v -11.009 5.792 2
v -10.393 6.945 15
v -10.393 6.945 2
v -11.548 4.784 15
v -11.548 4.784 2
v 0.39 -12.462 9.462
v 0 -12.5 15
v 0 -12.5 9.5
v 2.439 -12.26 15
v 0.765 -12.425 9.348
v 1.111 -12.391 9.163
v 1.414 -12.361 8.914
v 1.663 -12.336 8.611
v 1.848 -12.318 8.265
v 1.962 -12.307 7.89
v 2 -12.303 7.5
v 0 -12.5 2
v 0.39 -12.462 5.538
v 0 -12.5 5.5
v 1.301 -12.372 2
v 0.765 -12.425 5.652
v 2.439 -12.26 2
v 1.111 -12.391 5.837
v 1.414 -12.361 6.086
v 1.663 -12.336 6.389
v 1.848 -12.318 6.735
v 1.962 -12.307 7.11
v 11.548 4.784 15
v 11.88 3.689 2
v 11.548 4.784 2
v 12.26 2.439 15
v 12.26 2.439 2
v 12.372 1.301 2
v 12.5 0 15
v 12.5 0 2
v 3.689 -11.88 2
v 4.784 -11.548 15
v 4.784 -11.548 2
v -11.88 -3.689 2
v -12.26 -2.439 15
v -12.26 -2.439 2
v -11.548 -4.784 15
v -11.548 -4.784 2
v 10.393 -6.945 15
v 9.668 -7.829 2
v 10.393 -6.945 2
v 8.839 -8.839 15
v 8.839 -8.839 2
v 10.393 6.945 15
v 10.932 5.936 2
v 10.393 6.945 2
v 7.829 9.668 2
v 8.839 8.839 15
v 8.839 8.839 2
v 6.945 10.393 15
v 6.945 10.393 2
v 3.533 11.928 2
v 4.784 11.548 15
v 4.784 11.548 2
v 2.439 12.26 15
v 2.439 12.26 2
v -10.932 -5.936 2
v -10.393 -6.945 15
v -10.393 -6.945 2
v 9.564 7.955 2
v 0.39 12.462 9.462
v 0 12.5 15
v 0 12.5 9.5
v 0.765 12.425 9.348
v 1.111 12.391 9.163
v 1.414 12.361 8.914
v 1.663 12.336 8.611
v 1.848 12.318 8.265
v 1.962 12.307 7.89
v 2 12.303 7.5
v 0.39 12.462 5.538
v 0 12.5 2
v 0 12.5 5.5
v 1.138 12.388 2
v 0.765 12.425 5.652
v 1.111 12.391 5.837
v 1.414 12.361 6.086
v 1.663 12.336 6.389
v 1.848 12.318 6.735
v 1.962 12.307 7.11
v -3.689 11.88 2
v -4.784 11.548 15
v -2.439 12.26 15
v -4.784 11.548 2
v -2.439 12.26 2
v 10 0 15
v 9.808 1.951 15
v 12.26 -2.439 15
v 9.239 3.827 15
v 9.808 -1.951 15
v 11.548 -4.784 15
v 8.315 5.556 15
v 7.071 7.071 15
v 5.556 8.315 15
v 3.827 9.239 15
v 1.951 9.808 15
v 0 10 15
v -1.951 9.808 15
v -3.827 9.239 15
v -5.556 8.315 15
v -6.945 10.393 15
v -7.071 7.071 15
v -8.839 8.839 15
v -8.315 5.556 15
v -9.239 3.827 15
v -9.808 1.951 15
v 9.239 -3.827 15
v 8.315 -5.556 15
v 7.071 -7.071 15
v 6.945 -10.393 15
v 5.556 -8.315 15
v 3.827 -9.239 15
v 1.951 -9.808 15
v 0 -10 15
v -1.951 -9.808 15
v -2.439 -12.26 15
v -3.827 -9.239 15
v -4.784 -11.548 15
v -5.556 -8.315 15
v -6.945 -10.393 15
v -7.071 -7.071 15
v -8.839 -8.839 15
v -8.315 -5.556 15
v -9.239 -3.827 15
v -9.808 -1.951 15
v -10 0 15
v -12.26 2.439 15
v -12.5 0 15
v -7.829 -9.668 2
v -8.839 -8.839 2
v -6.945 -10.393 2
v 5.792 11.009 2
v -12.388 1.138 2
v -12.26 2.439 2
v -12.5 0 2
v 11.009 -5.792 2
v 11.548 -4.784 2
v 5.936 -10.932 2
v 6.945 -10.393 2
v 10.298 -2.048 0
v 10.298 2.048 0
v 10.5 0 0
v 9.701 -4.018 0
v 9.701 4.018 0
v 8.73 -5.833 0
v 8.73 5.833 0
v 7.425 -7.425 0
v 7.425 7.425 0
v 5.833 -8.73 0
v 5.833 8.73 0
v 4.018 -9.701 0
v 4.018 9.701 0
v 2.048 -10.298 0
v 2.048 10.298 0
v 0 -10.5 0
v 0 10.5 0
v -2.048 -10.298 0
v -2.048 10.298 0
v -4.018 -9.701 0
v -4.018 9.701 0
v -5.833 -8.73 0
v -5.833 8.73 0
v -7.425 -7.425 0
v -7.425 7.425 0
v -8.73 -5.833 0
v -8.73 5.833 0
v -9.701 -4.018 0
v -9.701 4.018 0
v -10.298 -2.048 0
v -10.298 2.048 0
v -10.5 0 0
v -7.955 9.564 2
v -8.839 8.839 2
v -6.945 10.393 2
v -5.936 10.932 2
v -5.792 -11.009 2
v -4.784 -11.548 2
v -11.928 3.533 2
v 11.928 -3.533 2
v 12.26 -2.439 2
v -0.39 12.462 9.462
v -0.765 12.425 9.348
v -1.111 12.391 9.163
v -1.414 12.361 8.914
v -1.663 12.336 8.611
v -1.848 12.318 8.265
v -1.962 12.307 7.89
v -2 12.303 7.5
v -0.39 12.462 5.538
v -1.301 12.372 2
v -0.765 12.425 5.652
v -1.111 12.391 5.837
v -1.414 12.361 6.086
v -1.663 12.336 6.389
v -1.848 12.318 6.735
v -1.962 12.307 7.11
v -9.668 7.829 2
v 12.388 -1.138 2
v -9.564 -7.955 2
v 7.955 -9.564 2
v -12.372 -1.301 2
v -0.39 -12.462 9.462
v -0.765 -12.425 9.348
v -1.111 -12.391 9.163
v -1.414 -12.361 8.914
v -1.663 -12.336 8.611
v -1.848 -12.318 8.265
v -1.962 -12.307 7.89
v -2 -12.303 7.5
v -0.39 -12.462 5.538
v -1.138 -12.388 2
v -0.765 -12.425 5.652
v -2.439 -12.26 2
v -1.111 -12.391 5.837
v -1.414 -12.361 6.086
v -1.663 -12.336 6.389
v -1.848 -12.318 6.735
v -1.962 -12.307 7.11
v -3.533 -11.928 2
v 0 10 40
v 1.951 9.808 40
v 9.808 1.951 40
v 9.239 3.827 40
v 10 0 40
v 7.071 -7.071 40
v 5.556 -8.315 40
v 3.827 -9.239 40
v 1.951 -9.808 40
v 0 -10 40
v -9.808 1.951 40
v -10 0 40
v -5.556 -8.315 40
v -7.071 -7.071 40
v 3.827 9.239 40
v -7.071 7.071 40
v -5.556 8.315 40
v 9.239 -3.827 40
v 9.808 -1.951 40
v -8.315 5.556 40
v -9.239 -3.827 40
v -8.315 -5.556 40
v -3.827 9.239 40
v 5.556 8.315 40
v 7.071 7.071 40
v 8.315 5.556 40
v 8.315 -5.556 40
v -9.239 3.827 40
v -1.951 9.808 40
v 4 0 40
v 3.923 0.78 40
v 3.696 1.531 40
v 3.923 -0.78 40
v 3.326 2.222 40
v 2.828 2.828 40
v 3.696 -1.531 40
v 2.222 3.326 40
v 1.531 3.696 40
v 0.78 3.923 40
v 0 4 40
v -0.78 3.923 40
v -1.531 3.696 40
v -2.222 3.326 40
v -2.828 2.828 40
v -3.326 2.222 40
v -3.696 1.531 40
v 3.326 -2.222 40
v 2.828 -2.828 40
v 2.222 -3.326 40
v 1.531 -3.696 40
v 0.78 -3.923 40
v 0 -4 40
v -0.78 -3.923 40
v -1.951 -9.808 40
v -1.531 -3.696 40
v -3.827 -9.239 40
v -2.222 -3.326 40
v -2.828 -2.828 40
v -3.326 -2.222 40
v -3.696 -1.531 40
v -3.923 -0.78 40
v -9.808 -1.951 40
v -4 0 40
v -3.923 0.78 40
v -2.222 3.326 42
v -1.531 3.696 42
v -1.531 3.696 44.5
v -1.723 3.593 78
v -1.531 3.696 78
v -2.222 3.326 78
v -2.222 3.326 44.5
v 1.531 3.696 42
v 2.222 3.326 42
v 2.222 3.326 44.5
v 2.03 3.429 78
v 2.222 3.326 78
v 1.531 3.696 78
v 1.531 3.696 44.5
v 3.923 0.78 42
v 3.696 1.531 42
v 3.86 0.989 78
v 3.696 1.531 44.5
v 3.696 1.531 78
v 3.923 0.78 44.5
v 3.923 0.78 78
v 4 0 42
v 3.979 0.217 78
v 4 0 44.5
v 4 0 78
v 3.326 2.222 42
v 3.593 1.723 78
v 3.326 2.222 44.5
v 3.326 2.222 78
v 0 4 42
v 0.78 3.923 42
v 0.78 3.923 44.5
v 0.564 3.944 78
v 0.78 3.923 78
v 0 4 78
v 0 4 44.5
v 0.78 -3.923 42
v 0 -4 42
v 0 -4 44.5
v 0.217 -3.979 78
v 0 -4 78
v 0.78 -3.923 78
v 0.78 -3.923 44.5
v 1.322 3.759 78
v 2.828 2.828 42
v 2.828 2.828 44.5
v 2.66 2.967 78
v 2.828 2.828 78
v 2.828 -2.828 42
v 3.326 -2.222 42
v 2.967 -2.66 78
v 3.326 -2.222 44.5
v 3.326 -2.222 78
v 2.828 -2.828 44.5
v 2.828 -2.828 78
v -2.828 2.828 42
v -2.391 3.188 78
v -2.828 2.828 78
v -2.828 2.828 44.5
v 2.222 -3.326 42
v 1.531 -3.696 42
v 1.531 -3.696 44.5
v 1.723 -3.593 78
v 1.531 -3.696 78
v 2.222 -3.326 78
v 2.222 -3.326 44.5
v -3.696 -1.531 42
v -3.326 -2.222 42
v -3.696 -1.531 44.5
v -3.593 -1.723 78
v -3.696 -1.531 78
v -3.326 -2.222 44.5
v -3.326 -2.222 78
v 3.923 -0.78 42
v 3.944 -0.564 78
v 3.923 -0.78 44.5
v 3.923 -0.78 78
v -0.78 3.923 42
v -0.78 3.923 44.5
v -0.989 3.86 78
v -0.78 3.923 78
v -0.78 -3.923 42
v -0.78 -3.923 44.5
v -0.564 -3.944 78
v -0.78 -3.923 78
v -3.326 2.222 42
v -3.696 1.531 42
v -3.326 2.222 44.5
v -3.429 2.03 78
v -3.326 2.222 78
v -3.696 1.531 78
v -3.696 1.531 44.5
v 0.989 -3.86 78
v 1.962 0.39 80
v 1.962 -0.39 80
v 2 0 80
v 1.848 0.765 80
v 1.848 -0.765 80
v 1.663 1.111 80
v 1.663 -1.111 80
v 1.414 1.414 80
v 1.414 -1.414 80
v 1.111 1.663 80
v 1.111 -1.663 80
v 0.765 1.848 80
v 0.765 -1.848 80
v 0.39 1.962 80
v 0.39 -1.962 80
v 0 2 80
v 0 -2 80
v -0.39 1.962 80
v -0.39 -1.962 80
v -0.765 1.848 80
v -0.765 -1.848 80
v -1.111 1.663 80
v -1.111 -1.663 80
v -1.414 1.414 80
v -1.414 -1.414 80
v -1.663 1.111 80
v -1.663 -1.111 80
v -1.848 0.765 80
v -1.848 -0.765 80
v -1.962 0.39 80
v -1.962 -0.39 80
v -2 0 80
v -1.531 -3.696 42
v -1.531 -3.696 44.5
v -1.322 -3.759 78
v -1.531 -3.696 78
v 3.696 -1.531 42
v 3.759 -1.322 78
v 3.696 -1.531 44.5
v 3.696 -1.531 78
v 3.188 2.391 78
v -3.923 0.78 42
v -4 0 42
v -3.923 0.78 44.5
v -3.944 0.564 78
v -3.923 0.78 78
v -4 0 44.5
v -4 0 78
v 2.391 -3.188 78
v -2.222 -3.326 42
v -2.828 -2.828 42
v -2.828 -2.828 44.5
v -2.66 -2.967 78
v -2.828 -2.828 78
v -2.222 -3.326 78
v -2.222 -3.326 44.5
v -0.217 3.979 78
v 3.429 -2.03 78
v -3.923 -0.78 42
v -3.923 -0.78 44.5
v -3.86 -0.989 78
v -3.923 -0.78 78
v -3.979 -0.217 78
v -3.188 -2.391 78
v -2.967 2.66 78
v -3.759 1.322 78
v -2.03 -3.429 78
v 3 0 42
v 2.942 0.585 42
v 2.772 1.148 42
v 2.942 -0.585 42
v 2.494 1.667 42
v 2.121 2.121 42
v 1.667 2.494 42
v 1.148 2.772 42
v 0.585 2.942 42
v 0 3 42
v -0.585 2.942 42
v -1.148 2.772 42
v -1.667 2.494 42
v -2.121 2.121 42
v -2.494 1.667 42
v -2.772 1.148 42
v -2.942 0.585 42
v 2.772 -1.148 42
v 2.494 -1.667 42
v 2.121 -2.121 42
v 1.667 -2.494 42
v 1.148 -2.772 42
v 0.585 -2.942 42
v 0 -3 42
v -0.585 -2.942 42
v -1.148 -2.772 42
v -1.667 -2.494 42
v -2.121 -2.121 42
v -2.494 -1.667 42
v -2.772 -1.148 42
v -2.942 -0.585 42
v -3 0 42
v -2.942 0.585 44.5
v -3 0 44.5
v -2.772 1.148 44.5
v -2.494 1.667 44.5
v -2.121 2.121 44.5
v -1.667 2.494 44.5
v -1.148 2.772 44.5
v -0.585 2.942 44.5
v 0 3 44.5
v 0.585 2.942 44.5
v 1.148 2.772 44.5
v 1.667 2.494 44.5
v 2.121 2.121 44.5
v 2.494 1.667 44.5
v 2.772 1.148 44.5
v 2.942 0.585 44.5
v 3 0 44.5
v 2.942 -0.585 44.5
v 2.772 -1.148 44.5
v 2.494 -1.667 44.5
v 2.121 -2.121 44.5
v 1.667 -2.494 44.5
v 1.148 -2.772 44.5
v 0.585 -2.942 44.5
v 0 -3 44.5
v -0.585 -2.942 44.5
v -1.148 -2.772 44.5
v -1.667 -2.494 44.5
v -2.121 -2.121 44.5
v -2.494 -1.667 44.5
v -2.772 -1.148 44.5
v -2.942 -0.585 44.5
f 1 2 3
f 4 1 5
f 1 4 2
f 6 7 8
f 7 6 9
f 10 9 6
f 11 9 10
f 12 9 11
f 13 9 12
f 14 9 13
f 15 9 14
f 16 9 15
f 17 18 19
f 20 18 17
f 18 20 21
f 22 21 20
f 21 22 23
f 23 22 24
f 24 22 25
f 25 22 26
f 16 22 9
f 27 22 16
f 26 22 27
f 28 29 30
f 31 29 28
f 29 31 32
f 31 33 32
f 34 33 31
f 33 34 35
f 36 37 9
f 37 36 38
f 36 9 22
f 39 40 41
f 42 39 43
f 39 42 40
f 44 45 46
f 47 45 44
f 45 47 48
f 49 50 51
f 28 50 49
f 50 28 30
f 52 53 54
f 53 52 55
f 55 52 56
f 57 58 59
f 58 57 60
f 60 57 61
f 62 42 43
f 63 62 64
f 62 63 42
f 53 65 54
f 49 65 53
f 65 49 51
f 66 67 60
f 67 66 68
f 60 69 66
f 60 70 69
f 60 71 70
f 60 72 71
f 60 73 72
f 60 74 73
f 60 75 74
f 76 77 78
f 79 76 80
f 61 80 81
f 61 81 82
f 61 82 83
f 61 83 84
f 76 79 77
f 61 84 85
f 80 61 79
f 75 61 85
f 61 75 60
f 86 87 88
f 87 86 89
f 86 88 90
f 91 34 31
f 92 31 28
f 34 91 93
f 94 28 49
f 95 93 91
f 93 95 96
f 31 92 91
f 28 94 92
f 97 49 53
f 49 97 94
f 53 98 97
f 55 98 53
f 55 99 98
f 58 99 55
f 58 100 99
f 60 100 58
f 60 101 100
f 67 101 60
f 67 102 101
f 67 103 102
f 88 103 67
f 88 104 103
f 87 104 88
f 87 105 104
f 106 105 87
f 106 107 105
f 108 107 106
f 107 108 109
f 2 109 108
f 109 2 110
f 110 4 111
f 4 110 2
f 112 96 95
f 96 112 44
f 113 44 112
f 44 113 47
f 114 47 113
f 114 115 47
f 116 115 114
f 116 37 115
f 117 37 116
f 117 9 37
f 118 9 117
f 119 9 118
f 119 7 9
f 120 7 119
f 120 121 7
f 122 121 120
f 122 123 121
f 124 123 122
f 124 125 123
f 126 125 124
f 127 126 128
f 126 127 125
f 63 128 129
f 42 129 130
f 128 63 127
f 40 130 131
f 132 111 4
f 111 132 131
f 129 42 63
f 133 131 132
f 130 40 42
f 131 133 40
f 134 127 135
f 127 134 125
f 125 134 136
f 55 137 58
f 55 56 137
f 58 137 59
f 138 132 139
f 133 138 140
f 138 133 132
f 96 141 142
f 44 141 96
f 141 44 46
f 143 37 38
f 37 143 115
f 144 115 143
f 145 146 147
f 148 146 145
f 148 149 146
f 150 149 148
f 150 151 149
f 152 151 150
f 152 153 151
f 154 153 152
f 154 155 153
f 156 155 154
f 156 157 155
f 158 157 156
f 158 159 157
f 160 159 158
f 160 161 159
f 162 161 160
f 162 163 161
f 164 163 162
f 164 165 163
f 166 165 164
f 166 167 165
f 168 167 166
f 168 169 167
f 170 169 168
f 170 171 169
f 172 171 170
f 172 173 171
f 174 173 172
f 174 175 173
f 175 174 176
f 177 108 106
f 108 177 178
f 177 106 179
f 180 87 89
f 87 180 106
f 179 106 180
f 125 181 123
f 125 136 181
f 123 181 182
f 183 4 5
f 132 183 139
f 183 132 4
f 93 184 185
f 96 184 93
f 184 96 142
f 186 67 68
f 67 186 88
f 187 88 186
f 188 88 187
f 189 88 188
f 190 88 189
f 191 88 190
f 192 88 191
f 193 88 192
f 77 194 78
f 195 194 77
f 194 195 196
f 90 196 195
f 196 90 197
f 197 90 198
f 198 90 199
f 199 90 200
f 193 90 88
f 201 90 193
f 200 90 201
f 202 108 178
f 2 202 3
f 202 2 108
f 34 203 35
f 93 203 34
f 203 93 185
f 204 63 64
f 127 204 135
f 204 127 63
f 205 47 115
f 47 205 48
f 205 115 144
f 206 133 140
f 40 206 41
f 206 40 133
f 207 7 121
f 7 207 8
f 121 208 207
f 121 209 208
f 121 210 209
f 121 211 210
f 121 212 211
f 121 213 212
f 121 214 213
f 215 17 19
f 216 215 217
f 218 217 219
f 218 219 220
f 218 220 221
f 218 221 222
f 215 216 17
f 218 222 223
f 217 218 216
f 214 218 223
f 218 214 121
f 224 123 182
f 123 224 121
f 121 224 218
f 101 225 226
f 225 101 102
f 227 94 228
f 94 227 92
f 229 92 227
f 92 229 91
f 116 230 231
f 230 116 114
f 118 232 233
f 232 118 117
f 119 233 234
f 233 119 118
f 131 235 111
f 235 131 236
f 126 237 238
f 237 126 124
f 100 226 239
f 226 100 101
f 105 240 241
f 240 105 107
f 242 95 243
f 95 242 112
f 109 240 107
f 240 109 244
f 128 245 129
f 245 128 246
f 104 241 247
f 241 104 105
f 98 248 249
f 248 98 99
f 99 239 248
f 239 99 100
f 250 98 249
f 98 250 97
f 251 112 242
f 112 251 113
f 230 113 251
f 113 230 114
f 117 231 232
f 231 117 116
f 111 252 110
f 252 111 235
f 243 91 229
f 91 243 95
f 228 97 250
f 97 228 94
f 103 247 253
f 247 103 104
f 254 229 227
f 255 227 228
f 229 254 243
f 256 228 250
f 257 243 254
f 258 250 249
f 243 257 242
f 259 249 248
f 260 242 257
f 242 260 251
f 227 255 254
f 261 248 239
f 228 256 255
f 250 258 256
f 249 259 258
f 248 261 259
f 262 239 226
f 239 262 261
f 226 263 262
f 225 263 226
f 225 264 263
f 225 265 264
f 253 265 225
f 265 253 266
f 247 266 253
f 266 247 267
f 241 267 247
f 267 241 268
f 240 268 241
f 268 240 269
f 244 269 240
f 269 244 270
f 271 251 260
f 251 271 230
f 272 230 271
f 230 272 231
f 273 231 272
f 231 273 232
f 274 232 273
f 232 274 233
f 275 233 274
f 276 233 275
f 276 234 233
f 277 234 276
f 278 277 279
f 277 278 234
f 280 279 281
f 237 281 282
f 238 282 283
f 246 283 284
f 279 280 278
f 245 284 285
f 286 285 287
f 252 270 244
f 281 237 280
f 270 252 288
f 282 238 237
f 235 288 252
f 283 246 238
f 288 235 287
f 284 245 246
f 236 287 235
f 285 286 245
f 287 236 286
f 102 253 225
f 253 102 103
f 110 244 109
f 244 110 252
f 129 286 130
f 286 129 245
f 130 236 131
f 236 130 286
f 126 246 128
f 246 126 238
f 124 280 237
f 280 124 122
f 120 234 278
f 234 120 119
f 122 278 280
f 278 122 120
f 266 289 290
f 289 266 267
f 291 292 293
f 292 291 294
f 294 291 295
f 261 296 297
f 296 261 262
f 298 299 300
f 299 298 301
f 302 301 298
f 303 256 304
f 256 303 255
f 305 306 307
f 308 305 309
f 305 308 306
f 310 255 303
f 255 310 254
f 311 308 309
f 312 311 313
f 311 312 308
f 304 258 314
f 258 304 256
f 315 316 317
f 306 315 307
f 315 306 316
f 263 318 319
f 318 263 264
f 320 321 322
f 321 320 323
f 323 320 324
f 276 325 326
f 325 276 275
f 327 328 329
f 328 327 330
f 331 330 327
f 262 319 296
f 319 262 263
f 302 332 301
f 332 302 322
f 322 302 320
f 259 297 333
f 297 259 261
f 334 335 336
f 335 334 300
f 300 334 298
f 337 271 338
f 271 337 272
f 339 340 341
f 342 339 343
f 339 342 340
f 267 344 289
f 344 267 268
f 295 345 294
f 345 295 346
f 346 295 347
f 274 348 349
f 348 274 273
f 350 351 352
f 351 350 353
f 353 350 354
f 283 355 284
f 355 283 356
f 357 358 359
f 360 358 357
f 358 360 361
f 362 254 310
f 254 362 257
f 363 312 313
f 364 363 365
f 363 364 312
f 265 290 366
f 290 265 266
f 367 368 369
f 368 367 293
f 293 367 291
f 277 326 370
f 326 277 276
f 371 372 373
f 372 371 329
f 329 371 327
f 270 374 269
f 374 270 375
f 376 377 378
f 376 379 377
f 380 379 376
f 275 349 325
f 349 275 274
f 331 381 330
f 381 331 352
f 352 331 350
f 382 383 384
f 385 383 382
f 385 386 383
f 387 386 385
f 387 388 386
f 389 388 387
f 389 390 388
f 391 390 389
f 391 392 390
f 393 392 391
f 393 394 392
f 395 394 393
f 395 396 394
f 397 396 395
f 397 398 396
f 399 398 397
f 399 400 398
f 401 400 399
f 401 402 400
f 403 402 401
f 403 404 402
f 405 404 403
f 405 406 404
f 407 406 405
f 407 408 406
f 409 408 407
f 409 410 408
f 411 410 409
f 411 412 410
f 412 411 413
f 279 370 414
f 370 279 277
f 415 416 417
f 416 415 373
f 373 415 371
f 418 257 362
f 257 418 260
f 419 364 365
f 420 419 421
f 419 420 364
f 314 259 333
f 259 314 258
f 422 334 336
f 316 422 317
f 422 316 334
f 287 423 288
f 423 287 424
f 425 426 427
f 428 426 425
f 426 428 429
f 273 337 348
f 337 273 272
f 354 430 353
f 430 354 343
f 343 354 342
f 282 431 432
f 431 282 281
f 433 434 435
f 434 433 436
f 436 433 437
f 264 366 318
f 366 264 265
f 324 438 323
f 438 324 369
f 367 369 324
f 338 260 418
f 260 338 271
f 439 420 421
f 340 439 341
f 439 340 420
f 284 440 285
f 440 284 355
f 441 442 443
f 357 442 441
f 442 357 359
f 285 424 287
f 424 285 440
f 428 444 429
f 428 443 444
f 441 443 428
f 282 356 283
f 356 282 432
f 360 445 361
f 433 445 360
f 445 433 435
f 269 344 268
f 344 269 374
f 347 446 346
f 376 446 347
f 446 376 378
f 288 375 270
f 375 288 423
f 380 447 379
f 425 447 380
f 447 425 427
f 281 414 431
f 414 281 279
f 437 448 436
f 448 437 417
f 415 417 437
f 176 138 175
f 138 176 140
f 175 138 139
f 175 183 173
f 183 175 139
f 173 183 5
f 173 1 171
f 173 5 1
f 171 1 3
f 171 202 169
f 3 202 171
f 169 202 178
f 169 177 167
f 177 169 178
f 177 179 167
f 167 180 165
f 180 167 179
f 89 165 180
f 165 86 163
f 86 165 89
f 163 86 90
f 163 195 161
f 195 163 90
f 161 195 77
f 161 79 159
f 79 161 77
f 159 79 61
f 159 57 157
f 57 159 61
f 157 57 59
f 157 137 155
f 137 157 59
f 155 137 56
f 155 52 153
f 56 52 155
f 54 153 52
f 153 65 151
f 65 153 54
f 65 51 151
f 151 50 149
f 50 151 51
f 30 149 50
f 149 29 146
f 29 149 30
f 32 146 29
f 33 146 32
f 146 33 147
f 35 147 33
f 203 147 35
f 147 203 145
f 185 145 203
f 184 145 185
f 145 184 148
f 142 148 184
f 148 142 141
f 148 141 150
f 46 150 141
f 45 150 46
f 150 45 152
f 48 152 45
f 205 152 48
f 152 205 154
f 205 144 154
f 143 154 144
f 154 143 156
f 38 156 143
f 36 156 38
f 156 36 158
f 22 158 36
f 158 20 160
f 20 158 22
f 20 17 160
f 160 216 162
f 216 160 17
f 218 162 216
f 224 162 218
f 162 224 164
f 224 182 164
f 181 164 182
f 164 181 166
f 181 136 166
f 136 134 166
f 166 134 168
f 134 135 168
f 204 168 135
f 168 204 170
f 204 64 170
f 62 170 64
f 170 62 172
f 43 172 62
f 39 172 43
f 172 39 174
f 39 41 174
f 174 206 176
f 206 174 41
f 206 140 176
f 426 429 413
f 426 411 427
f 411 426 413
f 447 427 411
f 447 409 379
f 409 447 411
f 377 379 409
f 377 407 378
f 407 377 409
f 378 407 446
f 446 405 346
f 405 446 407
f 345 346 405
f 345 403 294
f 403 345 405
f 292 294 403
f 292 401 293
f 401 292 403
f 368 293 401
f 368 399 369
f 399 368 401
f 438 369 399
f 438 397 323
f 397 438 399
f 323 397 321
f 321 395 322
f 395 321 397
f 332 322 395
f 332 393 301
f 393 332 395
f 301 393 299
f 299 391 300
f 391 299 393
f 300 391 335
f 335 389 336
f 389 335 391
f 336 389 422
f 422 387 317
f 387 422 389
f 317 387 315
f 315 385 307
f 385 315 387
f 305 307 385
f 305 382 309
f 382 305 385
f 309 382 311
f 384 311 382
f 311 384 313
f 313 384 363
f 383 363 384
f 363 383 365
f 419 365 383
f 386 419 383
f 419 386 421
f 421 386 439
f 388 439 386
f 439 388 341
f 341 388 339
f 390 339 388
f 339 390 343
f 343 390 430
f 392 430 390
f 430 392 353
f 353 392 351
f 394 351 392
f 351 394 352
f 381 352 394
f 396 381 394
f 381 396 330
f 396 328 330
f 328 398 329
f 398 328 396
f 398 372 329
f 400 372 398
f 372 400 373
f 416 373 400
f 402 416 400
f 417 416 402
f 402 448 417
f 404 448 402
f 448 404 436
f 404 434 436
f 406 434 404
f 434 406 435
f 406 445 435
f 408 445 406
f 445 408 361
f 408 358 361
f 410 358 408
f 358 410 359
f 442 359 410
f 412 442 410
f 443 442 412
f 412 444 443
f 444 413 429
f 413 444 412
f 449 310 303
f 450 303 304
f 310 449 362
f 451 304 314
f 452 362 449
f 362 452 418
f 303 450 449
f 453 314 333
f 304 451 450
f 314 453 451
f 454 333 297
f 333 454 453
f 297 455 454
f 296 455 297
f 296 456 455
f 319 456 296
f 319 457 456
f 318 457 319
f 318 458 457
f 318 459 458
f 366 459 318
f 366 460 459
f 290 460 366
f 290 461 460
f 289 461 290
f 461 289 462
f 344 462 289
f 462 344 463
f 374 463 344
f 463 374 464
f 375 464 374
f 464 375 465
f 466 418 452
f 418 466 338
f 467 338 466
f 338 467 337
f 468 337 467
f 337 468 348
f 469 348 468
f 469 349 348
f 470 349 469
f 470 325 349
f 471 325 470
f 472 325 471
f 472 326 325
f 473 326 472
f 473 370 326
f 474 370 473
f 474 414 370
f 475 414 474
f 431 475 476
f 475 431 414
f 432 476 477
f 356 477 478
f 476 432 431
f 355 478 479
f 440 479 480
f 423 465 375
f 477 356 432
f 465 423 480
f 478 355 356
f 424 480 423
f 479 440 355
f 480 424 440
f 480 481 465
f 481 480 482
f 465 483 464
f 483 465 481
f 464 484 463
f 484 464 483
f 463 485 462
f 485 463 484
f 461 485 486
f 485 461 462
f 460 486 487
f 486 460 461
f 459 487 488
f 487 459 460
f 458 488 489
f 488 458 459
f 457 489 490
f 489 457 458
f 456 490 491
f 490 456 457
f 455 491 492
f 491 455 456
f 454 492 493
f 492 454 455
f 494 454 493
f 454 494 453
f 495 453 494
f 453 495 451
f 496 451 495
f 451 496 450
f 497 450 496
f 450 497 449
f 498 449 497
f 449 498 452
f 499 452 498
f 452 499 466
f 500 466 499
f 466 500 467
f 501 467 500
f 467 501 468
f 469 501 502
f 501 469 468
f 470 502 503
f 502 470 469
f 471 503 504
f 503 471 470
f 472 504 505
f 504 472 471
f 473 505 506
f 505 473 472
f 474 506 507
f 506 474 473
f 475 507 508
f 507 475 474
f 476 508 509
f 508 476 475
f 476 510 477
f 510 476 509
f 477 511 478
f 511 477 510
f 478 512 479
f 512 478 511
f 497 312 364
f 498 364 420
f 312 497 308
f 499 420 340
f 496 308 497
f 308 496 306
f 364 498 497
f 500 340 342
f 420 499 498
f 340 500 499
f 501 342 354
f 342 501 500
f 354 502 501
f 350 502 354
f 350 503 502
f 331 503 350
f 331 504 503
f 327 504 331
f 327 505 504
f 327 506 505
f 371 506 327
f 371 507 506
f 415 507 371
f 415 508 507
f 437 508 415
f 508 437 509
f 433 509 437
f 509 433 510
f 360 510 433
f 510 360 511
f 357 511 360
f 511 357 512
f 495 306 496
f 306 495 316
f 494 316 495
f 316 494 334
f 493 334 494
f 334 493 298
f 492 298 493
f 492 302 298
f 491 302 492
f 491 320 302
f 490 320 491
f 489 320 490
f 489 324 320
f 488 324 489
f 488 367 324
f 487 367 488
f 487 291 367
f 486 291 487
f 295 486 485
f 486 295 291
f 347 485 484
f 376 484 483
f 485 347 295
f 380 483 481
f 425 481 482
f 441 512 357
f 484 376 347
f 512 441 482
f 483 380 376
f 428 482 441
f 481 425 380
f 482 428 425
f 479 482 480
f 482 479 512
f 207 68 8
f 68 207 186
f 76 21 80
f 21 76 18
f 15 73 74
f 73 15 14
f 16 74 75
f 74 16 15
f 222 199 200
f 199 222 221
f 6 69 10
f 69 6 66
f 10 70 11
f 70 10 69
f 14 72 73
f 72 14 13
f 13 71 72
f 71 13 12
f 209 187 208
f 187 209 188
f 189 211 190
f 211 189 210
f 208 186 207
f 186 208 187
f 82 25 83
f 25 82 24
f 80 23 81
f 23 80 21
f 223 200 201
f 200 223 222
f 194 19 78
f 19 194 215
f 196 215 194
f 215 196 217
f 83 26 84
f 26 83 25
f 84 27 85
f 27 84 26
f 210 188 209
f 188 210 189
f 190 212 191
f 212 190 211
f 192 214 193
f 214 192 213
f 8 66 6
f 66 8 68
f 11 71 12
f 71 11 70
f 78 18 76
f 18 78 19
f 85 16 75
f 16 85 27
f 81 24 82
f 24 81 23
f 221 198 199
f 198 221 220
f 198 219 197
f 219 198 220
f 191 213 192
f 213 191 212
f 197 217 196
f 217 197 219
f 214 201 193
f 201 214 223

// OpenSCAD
$fn = 32;

// ----------------------------------------------------------------------
// Stepped shaft: diameters 25, 20, 8 mm, 80 mm long
// ----------------------------------------------------------------------

// --- parameters (mm) ---
d1 = 25;                  // step 1 diameter
len1 = 15;                // step 1 length
d2 = 20;                  // step 2 diameter
len2 = 25;                // step 2 length
d3 = 8;                   // step 3 diameter
len3 = 40;                // step 3 length
total = 80;               // overall length
chamfer = 2;              // end chamfer
groove_r = 4;             // groove radius
groove_z = 42;            // groove position from the end
groove_w = 2.5;           // groove width
groove_d = 1;             // groove depth
cross_d = 4;              // cross pin hole
cross_z = 7.5;            // cross hole position

difference() {
  /* turned body: stacked cylinders, every step sunk into the bigger one */
  union() {
    cylinder(h = len1, d = d1);
    translate([0, 0, 14.6]) cylinder(h = 25.4, d = d2);
    translate([0, 0, 39.6]) cylinder(h = 40.4, d = d3);
  }
  /* bottom chamfer ring cut */
  rotate_extrude() translate([10.5, -2.5]) polygon([[0, 0], [4.5, 0], [4.5, 7], [0, 2.5]]);
  /* top chamfer ring cut */
  rotate_extrude() translate([2, 80]) polygon([[0, 0], [4.5, -4.5], [4.5, 2.5], [0, 2.5]]);
  /* circlip groove just behind the shoulder */
  rotate_extrude() translate([groove_r - groove_d, groove_z]) square([groove_d + 2.5, groove_w]);
  /* cross pin hole through the small step */
  translate([0, 0, cross_z]) rotate([90, 0, 0]) cylinder(h = d1 + 5, d = cross_d, center = true);
}
